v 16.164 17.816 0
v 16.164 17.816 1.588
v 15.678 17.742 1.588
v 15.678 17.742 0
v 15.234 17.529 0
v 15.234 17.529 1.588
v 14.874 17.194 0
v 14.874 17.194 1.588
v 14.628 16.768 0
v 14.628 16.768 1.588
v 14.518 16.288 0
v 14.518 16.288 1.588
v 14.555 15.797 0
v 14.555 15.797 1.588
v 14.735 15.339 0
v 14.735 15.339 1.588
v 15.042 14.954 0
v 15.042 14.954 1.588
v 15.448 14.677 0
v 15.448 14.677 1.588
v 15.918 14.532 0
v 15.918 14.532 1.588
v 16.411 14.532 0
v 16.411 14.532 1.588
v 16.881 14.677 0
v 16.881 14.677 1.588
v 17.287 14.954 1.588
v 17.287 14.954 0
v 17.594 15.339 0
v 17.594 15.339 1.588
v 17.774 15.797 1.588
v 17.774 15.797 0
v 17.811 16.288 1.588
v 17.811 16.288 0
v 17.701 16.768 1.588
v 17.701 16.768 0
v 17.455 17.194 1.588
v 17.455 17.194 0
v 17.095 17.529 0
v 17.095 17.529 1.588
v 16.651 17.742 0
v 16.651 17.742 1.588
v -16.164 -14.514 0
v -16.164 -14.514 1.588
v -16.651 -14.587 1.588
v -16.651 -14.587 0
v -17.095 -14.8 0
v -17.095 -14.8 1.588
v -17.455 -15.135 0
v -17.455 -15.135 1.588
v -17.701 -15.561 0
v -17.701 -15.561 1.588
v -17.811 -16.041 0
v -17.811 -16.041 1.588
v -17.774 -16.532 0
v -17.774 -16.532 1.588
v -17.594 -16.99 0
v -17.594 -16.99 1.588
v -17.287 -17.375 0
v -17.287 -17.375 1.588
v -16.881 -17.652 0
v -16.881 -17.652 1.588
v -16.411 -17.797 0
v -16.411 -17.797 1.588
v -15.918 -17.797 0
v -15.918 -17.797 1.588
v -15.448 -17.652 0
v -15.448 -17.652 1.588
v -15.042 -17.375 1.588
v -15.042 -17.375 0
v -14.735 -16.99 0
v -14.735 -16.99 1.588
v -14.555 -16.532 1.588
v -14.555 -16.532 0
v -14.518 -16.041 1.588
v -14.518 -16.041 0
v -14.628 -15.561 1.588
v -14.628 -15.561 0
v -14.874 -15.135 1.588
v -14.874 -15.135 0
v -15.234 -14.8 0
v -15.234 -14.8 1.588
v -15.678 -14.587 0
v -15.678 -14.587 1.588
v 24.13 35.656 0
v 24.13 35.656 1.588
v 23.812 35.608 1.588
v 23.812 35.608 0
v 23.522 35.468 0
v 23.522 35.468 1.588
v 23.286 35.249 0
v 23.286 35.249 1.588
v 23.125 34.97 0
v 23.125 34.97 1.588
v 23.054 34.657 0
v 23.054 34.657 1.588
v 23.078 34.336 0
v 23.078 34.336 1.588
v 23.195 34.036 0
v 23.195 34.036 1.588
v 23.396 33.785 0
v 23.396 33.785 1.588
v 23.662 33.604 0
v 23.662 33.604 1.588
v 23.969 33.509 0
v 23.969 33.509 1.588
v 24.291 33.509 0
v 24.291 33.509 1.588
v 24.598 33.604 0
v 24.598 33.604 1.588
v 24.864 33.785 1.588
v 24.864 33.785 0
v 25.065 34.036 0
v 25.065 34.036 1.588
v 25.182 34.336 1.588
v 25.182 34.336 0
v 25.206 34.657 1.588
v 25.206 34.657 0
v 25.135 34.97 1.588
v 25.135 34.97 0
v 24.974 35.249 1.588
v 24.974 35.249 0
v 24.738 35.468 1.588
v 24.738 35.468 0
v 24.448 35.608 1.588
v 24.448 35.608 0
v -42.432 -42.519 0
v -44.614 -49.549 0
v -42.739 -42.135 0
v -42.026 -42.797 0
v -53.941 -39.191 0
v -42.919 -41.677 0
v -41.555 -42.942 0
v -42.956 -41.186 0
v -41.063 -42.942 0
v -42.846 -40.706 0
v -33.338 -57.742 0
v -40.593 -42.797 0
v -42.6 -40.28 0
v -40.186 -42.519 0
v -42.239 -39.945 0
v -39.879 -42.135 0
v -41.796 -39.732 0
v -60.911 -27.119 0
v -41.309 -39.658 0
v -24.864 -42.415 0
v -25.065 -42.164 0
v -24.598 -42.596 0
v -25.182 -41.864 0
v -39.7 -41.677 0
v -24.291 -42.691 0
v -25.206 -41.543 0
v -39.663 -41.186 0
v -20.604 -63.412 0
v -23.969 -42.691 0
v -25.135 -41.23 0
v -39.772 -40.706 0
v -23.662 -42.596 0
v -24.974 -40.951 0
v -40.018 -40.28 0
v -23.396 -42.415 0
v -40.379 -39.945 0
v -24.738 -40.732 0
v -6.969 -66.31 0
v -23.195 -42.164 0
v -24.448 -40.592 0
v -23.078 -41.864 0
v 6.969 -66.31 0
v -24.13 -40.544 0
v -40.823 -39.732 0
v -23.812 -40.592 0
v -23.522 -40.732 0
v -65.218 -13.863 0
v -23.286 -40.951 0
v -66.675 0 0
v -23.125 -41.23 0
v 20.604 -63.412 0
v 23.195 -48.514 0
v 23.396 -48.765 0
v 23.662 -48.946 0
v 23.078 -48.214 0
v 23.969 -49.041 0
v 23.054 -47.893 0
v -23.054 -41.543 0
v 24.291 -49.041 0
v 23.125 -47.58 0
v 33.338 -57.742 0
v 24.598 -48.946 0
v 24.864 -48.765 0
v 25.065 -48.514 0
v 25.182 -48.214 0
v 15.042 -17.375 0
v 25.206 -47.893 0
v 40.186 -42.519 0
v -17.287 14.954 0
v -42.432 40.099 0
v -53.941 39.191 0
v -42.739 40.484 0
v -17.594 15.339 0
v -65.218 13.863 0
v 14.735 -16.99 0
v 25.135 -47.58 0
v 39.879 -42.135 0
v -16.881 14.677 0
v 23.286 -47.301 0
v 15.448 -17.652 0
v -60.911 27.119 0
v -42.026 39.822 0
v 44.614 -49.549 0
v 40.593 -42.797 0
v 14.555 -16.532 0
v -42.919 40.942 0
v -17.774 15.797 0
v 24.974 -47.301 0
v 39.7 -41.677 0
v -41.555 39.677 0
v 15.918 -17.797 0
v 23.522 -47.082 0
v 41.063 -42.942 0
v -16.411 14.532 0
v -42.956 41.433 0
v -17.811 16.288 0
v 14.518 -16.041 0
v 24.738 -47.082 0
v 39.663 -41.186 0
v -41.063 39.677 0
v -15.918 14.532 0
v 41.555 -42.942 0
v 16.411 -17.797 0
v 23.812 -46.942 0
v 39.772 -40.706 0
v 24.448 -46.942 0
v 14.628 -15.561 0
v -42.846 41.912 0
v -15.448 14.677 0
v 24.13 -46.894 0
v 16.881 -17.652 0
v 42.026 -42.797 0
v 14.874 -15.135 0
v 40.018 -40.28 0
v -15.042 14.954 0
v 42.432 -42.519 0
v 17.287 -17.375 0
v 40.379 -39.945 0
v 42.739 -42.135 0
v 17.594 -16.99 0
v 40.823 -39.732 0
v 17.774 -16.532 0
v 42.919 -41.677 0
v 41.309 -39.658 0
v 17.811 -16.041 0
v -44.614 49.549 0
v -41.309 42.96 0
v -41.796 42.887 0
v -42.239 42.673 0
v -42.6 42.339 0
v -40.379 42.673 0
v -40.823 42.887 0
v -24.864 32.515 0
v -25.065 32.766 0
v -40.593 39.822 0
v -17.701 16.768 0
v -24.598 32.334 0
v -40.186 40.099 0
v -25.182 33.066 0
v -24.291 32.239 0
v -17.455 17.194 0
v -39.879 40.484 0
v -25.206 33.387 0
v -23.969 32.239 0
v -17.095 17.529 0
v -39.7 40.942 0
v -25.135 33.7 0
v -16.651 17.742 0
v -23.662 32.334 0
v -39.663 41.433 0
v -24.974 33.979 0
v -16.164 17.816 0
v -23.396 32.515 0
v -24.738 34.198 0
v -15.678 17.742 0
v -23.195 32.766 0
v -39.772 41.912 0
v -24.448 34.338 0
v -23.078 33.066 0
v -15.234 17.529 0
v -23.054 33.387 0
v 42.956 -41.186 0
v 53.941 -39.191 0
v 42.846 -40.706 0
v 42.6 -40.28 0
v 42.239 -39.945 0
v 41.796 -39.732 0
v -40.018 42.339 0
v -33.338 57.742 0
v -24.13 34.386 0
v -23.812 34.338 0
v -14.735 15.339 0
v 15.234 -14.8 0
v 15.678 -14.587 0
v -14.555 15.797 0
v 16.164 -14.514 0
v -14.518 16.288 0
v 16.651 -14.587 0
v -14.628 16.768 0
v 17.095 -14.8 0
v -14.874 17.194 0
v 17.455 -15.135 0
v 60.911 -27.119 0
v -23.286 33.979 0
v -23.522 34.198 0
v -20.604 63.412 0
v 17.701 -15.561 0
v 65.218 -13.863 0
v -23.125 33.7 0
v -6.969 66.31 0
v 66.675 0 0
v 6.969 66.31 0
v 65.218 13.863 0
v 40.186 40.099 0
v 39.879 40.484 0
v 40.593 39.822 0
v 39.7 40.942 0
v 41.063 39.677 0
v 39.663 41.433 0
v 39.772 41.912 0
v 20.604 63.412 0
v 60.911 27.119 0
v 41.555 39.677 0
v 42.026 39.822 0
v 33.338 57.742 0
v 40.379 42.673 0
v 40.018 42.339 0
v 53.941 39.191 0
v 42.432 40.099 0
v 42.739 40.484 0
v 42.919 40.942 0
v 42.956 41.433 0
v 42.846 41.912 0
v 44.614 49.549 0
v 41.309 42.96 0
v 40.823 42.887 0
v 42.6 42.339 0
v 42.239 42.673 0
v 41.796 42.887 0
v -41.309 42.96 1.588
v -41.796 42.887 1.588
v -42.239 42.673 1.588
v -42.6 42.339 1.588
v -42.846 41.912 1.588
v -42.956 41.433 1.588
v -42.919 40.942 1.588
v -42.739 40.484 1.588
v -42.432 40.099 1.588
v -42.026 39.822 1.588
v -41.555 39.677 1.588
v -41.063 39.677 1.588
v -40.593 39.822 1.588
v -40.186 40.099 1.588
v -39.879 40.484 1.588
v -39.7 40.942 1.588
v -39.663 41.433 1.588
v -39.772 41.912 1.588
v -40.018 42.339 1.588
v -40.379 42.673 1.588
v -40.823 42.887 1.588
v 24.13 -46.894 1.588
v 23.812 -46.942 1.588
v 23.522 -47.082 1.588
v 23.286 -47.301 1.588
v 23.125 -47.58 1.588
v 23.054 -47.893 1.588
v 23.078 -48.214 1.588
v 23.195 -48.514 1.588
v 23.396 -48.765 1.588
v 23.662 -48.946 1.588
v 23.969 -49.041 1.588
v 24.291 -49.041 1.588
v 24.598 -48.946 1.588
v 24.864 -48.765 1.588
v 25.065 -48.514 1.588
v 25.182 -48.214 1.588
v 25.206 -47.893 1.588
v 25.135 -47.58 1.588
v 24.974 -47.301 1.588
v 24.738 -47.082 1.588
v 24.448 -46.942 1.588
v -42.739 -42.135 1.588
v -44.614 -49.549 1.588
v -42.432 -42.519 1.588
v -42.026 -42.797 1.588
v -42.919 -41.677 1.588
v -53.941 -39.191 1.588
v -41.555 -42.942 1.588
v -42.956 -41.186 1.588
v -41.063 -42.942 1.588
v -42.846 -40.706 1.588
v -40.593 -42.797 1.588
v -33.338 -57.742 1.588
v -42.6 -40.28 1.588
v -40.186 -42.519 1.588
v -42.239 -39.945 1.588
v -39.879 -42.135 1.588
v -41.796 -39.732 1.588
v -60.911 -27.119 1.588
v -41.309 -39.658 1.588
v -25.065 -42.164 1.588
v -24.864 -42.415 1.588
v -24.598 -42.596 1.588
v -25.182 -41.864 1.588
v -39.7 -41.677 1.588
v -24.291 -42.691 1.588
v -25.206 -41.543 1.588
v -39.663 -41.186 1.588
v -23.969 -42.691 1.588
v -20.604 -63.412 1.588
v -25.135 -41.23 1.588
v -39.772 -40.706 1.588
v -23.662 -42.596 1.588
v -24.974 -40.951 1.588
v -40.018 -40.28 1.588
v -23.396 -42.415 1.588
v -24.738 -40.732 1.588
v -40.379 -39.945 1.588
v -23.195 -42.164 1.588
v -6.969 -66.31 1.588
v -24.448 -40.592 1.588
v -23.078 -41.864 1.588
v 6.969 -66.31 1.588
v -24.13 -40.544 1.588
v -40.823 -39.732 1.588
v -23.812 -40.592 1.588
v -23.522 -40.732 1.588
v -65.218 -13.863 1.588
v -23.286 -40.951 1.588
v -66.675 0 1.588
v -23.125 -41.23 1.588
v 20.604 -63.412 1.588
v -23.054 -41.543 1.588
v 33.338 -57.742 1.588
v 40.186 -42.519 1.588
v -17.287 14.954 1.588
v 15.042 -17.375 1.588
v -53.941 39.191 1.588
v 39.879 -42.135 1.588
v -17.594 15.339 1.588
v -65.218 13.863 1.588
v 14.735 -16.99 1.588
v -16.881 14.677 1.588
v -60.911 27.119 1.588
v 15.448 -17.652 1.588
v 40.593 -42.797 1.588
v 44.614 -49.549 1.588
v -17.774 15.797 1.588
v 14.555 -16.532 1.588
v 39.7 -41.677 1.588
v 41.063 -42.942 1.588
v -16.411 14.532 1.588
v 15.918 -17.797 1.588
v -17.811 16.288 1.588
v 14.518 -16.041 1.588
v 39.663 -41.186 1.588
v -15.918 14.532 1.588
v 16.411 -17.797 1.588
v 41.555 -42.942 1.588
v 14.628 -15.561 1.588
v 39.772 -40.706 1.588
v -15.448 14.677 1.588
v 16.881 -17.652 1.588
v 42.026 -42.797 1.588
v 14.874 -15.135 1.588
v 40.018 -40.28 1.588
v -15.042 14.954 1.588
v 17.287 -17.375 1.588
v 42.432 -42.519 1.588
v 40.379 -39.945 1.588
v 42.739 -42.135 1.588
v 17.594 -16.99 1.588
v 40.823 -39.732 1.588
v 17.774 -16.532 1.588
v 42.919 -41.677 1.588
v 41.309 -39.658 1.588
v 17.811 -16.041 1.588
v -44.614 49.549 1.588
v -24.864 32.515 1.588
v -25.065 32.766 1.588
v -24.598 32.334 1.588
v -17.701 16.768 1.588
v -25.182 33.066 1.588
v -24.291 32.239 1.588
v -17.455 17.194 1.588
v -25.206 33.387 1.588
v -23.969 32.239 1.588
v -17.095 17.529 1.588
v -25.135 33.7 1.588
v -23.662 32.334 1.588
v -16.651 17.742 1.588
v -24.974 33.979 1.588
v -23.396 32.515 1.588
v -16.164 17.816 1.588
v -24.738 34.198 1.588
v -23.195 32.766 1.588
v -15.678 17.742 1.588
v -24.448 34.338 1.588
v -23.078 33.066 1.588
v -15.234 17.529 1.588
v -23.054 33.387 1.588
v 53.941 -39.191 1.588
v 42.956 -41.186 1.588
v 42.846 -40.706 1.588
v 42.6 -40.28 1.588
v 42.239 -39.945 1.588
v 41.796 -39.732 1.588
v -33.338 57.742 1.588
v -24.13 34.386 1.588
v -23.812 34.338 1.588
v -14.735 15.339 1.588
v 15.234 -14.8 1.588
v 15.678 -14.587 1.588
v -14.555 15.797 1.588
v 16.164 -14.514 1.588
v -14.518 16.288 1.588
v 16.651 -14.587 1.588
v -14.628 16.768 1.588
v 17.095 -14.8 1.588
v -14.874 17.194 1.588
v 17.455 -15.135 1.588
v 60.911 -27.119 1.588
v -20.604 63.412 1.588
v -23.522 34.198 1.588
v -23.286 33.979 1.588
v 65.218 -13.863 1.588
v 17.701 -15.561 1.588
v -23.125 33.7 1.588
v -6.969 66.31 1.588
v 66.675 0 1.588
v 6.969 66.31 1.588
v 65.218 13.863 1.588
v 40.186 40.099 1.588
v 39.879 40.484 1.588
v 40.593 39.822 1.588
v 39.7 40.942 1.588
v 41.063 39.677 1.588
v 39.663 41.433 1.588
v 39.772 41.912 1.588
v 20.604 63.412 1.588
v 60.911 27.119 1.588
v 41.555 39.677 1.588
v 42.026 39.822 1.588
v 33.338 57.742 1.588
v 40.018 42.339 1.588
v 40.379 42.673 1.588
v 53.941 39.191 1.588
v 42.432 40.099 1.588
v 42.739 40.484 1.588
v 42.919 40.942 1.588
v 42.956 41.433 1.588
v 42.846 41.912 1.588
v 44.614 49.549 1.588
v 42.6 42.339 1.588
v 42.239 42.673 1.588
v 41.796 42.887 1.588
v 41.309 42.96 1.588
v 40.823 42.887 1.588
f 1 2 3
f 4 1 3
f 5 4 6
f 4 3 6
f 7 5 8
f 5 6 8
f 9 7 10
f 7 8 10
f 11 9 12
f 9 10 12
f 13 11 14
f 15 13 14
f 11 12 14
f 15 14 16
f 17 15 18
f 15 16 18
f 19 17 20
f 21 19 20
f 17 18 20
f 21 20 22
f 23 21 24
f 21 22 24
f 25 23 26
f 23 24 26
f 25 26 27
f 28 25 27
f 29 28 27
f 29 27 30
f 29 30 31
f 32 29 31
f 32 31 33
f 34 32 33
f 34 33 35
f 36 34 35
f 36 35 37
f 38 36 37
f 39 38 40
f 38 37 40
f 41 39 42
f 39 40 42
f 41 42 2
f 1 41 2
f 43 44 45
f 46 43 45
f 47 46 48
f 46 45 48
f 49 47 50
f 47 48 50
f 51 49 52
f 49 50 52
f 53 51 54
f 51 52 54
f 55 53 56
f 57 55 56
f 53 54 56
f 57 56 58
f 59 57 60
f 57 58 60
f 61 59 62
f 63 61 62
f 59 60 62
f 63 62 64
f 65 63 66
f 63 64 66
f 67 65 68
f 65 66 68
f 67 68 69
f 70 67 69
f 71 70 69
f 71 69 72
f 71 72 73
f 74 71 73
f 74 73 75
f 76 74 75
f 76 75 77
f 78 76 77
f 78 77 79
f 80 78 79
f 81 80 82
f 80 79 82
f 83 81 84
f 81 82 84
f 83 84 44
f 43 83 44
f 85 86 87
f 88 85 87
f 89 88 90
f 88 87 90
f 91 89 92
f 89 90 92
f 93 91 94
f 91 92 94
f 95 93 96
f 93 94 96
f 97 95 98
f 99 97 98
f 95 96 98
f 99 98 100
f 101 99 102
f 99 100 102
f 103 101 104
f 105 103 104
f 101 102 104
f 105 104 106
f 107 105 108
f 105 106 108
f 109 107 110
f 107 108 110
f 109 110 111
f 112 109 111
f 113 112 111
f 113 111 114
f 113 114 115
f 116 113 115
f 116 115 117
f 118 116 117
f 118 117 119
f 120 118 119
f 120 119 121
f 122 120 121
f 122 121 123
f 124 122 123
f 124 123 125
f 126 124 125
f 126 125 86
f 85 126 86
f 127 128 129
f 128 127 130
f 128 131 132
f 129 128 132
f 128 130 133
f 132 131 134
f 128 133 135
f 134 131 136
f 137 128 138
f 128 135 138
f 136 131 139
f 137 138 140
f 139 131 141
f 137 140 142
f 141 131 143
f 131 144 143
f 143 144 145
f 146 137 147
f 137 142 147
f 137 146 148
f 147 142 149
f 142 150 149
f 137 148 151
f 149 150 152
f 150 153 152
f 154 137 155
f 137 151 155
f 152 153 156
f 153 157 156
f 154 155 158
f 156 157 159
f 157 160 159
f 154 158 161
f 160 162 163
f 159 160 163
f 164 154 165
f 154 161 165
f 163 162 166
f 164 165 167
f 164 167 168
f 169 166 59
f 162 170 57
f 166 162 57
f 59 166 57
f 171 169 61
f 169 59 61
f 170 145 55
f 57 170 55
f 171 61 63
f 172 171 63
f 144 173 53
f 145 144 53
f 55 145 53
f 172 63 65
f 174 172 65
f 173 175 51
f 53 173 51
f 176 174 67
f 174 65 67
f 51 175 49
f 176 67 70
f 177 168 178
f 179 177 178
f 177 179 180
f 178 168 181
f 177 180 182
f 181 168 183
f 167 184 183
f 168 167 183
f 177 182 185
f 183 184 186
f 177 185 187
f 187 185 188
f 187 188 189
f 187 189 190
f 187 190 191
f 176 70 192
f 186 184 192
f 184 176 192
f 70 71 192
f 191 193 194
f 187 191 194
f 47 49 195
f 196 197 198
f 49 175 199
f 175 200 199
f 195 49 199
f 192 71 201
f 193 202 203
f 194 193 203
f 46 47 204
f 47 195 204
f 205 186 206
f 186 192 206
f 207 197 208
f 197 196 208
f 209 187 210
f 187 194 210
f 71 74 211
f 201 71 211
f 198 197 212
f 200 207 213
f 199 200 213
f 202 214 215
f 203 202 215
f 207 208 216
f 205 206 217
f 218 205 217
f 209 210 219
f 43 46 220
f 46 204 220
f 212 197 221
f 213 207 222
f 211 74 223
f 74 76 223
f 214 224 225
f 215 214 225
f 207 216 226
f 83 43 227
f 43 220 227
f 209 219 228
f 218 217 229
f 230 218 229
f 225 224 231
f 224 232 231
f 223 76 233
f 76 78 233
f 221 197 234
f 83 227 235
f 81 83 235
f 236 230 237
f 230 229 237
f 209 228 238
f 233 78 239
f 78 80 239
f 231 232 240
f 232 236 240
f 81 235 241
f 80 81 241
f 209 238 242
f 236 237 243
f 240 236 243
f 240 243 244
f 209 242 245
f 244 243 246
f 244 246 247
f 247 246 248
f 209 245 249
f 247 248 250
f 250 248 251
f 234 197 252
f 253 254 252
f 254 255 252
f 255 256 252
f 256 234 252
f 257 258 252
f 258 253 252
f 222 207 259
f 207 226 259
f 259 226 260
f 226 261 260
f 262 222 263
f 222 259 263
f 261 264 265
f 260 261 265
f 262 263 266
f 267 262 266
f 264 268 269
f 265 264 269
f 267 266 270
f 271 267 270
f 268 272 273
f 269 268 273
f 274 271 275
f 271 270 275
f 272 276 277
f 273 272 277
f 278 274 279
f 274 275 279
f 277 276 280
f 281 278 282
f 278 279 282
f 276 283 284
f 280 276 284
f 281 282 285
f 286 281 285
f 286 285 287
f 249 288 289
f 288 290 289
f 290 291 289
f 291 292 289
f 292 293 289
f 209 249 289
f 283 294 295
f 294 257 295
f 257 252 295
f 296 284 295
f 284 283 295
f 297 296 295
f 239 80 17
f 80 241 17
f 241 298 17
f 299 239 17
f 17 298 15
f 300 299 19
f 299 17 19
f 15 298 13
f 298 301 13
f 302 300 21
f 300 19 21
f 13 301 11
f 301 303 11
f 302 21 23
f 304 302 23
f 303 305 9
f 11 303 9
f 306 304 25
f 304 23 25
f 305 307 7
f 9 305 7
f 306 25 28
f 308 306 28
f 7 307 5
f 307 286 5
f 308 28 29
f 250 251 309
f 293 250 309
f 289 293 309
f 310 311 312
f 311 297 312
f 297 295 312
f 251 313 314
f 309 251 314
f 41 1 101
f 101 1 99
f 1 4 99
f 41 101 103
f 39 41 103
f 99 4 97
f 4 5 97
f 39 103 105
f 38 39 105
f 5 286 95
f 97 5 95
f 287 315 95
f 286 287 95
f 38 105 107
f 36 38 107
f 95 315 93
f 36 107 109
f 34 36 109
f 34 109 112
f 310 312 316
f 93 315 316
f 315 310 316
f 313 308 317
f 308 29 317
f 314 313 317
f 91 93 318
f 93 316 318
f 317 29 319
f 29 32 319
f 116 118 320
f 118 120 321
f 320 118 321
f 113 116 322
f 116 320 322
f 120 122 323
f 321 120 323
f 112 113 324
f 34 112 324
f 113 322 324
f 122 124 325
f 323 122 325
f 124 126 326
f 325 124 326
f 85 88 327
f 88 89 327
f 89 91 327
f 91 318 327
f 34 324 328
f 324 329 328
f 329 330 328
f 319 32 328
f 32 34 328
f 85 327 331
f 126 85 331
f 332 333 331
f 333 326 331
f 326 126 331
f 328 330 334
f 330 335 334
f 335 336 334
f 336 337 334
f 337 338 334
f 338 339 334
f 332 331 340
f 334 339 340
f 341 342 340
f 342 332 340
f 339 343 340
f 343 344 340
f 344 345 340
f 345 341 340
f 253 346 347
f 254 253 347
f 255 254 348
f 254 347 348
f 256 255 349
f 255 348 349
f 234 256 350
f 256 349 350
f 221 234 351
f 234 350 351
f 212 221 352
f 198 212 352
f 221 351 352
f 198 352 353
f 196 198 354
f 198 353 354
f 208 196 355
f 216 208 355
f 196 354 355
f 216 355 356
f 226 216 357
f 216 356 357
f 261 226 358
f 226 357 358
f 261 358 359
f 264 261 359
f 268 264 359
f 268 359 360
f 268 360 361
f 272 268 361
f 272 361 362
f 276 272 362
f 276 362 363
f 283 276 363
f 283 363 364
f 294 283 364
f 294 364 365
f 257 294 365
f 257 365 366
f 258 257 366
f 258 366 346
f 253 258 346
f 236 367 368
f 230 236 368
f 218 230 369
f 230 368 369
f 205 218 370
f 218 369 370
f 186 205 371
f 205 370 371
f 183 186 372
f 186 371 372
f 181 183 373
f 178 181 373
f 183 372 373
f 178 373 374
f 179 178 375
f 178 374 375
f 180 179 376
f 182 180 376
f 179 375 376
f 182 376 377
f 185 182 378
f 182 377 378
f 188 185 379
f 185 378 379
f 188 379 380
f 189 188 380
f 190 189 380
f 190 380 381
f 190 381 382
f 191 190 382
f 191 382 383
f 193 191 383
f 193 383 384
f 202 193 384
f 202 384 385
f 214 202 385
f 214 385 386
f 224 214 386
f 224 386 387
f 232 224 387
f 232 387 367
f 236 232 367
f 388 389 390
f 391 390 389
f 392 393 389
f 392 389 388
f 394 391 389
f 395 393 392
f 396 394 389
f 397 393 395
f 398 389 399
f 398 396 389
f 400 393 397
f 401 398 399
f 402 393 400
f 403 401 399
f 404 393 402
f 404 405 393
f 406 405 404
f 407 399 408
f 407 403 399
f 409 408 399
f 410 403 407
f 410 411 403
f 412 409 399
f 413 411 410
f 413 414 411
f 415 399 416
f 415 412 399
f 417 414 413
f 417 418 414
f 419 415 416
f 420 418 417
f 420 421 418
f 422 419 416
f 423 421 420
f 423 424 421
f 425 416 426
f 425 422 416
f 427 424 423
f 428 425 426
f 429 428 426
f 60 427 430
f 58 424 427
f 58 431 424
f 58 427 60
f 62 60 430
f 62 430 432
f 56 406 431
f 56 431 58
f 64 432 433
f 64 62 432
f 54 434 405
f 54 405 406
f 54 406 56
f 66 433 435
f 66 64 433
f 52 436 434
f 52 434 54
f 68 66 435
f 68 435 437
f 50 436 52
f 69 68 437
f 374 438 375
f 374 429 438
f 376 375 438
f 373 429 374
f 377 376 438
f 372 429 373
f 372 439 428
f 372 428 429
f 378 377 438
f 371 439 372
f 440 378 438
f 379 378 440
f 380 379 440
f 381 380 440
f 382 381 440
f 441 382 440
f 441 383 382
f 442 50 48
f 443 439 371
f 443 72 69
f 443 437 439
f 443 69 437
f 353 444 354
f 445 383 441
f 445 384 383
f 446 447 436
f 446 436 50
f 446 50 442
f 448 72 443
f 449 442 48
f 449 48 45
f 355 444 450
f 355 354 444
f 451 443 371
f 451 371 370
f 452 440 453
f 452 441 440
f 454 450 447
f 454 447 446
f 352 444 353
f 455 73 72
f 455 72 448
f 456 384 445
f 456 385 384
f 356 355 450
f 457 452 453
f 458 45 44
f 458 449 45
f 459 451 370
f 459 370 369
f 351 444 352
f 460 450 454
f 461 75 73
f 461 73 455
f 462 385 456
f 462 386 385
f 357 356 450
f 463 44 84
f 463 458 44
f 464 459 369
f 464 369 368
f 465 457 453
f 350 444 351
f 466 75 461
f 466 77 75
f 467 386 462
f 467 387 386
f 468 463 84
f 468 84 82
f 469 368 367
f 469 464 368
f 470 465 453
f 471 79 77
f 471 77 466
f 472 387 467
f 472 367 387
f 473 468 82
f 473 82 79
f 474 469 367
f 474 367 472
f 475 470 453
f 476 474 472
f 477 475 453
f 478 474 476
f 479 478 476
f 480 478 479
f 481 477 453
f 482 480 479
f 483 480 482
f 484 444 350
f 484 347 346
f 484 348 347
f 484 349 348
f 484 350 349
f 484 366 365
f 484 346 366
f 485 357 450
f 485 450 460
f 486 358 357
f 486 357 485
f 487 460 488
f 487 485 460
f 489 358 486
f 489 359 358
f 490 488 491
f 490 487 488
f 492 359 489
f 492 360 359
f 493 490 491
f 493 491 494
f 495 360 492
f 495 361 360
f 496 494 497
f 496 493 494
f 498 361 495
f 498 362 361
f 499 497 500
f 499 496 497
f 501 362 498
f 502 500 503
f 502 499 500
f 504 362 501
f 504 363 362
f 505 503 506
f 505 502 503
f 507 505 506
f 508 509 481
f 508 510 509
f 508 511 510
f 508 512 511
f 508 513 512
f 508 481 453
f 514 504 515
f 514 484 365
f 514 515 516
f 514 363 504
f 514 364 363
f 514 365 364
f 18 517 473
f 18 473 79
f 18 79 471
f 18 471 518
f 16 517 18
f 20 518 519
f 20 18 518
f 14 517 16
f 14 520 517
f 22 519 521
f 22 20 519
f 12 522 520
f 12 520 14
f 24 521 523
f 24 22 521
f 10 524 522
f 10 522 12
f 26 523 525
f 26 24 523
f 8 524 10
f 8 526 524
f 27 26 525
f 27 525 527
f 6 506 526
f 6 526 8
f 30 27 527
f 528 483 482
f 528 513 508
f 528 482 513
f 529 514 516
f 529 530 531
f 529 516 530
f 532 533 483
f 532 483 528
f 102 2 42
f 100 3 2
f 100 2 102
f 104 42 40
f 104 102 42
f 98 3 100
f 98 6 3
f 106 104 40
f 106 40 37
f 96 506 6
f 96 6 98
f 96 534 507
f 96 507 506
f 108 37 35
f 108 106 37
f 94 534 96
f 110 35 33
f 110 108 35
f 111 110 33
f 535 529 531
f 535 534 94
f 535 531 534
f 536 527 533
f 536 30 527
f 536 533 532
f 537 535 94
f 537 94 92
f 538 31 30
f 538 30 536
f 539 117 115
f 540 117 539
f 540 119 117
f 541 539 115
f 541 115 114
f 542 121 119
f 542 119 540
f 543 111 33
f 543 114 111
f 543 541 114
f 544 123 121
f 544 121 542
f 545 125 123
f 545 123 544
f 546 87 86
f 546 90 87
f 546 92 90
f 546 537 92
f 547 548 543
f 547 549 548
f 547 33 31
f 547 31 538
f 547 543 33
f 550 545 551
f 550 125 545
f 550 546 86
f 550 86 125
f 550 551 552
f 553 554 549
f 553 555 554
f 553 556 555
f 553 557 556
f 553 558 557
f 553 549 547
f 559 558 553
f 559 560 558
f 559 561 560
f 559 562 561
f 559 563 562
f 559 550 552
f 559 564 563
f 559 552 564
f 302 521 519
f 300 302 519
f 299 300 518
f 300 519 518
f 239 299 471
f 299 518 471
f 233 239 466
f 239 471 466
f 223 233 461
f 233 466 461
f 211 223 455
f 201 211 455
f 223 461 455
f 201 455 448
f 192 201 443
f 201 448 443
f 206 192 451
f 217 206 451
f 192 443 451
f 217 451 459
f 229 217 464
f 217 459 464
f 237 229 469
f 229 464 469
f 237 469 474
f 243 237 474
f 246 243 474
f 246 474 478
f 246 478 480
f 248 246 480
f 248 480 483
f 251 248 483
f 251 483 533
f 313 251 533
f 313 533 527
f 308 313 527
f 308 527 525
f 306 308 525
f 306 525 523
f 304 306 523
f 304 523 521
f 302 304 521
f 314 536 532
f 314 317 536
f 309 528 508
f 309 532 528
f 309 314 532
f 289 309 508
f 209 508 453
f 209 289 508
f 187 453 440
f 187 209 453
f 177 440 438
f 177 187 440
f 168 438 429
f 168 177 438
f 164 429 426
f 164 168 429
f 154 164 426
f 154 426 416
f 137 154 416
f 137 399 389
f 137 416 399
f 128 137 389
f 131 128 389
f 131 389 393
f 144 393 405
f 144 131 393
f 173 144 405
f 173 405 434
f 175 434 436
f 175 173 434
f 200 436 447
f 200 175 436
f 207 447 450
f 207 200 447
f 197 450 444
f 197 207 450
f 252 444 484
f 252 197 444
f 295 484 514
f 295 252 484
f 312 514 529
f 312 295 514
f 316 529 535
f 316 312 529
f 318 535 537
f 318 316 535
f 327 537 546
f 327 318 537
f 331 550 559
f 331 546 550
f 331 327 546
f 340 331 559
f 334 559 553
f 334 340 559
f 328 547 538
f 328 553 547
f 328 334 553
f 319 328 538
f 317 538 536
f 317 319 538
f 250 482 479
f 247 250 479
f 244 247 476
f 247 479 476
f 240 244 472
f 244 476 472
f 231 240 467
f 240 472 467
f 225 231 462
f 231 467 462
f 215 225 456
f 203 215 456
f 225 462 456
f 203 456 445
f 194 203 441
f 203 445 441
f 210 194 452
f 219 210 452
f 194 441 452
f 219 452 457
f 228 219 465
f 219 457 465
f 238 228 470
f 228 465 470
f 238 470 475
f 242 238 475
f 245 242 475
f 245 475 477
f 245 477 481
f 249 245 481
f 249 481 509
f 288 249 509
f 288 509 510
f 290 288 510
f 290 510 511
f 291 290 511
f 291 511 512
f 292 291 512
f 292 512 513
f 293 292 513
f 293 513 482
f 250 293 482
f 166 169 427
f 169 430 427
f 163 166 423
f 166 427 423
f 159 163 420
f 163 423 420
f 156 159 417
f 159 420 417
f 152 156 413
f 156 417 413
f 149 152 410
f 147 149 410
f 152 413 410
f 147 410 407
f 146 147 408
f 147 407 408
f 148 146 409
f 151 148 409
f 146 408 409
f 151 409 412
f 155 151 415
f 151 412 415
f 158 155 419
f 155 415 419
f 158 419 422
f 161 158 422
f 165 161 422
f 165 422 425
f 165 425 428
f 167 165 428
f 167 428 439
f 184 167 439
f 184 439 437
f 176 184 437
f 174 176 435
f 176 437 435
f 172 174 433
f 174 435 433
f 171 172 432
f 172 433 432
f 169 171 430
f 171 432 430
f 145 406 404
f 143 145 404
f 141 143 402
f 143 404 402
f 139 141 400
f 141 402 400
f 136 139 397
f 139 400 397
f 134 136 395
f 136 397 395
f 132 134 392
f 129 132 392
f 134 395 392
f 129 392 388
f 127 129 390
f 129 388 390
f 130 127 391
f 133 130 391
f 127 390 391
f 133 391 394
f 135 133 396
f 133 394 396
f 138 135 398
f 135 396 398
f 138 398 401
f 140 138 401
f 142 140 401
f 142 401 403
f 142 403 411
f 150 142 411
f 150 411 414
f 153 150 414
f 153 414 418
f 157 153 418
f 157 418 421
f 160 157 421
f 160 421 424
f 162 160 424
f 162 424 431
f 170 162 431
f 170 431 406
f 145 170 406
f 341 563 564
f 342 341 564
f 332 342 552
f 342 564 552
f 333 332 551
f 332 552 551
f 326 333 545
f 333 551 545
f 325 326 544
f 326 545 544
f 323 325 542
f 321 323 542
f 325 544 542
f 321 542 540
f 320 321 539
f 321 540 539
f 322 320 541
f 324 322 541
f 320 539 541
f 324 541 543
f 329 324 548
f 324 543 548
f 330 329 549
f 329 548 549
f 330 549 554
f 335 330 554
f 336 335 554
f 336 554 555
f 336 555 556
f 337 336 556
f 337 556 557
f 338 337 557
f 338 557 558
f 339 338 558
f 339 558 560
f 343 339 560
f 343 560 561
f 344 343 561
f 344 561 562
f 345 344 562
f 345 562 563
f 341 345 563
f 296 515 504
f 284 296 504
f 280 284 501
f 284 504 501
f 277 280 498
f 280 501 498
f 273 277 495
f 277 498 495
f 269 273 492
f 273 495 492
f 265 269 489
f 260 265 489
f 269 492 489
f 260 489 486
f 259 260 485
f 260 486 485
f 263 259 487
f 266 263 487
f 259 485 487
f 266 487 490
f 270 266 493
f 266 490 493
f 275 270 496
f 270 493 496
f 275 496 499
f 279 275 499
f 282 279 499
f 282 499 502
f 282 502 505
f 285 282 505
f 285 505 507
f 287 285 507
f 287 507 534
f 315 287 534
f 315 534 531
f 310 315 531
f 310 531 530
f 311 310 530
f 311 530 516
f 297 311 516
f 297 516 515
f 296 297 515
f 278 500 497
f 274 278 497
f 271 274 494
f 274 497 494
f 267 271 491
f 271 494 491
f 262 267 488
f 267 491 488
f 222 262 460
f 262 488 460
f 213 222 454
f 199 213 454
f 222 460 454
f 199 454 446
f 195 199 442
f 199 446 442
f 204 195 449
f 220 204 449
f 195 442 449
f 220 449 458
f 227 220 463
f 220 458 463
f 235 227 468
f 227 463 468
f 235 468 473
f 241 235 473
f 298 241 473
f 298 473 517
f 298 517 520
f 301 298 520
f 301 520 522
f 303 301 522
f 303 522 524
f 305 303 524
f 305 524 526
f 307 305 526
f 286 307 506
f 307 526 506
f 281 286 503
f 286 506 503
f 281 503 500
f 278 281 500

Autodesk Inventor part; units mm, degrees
ref_plane "YZ Plane" through (0, 0, 0) normal (1, 0, 0) x (0, 1, 0)
ref_plane "XZ Plane" through (0, 0, 0) normal (0, 1, 0) x (-1, 0, 0)
ref_plane "XY Plane" through (0, 0, 0) normal (0, 0, 1) x (1, 0, 0)
sketch "Sketch1" plane through (0, 0, 0) normal (0, 0, 1) x (1, 0, 0)
  line L0 (0, 3.1673) -> (0, -2.4908)
  line L1 (-20.5368, 0) -> (25.7294, 0)
  line L2 (0, 0) -> (-9.8402, -9.8402)
  line L3 (0, 0) -> (13.9161, 0) construction
  line L4 (0, 0) -> (-23.2805, 23.2805)
  circle A0 centre (0, 0) radius 66.675
  point P0 (-16.1645, 16.1645)
  point P1 (-41.3092, 41.3092)
  point P2 (-41.3092, -41.3092)
  point P3 (-16.1645, -16.1645)
  point P4 (16.1645, 16.1645)
  point P5 (41.3092, 41.3092)
  point P6 (41.3092, -41.3092)
  point P7 (16.1645, -16.1645)
  point P8 (24.13, -47.9739)
  point P9 (24.13, 34.5761)
  point P10 (-24.13, 33.3061)
  point P11 (-24.13, -41.6239)
  dimension "d1" = 45
  dimension "d57" = 35.56
  dimension "d58" = 22.86
  dimension "d59" = 48.26
  dimension "d60" = 48.26
  dimension "d61" = 74.93
  dimension "d62" = 82.55
  dimension "d63" = 6.35
  dimension "d64" = 1.27
  dimension "d65" = 24.13
  dimension "d66" = 133.35
extrude "Extrusion1" add sketch "Sketch1" along normal blind 1.5875
hole "Hole1" at (-16.1645, 16.1645, 0) at (-41.3092, 41.3092, 0) at (-41.3092, -41.3092, 0) at (-16.1645, -16.1645, 0) at (41.3092, 41.3092, 0) at (16.1645, 16.1645, 0) at (16.1645, -16.1645, 0) at (41.3092, -41.3092, 0) direction (0, 0, 1) diameter 3.302 end through all thread size "8-32 UNC" class "2B" standard "ANSI Unified Screw Threads"
hole "Hole2" at (24.13, -47.9739, 0) at (24.13, 34.5761, 0) at (-24.13, 33.3061, 0) at (-24.13, -41.6239, 0) direction (0, 0, 1) diameter 2.159 end through all
properties part number "BaseTop"
